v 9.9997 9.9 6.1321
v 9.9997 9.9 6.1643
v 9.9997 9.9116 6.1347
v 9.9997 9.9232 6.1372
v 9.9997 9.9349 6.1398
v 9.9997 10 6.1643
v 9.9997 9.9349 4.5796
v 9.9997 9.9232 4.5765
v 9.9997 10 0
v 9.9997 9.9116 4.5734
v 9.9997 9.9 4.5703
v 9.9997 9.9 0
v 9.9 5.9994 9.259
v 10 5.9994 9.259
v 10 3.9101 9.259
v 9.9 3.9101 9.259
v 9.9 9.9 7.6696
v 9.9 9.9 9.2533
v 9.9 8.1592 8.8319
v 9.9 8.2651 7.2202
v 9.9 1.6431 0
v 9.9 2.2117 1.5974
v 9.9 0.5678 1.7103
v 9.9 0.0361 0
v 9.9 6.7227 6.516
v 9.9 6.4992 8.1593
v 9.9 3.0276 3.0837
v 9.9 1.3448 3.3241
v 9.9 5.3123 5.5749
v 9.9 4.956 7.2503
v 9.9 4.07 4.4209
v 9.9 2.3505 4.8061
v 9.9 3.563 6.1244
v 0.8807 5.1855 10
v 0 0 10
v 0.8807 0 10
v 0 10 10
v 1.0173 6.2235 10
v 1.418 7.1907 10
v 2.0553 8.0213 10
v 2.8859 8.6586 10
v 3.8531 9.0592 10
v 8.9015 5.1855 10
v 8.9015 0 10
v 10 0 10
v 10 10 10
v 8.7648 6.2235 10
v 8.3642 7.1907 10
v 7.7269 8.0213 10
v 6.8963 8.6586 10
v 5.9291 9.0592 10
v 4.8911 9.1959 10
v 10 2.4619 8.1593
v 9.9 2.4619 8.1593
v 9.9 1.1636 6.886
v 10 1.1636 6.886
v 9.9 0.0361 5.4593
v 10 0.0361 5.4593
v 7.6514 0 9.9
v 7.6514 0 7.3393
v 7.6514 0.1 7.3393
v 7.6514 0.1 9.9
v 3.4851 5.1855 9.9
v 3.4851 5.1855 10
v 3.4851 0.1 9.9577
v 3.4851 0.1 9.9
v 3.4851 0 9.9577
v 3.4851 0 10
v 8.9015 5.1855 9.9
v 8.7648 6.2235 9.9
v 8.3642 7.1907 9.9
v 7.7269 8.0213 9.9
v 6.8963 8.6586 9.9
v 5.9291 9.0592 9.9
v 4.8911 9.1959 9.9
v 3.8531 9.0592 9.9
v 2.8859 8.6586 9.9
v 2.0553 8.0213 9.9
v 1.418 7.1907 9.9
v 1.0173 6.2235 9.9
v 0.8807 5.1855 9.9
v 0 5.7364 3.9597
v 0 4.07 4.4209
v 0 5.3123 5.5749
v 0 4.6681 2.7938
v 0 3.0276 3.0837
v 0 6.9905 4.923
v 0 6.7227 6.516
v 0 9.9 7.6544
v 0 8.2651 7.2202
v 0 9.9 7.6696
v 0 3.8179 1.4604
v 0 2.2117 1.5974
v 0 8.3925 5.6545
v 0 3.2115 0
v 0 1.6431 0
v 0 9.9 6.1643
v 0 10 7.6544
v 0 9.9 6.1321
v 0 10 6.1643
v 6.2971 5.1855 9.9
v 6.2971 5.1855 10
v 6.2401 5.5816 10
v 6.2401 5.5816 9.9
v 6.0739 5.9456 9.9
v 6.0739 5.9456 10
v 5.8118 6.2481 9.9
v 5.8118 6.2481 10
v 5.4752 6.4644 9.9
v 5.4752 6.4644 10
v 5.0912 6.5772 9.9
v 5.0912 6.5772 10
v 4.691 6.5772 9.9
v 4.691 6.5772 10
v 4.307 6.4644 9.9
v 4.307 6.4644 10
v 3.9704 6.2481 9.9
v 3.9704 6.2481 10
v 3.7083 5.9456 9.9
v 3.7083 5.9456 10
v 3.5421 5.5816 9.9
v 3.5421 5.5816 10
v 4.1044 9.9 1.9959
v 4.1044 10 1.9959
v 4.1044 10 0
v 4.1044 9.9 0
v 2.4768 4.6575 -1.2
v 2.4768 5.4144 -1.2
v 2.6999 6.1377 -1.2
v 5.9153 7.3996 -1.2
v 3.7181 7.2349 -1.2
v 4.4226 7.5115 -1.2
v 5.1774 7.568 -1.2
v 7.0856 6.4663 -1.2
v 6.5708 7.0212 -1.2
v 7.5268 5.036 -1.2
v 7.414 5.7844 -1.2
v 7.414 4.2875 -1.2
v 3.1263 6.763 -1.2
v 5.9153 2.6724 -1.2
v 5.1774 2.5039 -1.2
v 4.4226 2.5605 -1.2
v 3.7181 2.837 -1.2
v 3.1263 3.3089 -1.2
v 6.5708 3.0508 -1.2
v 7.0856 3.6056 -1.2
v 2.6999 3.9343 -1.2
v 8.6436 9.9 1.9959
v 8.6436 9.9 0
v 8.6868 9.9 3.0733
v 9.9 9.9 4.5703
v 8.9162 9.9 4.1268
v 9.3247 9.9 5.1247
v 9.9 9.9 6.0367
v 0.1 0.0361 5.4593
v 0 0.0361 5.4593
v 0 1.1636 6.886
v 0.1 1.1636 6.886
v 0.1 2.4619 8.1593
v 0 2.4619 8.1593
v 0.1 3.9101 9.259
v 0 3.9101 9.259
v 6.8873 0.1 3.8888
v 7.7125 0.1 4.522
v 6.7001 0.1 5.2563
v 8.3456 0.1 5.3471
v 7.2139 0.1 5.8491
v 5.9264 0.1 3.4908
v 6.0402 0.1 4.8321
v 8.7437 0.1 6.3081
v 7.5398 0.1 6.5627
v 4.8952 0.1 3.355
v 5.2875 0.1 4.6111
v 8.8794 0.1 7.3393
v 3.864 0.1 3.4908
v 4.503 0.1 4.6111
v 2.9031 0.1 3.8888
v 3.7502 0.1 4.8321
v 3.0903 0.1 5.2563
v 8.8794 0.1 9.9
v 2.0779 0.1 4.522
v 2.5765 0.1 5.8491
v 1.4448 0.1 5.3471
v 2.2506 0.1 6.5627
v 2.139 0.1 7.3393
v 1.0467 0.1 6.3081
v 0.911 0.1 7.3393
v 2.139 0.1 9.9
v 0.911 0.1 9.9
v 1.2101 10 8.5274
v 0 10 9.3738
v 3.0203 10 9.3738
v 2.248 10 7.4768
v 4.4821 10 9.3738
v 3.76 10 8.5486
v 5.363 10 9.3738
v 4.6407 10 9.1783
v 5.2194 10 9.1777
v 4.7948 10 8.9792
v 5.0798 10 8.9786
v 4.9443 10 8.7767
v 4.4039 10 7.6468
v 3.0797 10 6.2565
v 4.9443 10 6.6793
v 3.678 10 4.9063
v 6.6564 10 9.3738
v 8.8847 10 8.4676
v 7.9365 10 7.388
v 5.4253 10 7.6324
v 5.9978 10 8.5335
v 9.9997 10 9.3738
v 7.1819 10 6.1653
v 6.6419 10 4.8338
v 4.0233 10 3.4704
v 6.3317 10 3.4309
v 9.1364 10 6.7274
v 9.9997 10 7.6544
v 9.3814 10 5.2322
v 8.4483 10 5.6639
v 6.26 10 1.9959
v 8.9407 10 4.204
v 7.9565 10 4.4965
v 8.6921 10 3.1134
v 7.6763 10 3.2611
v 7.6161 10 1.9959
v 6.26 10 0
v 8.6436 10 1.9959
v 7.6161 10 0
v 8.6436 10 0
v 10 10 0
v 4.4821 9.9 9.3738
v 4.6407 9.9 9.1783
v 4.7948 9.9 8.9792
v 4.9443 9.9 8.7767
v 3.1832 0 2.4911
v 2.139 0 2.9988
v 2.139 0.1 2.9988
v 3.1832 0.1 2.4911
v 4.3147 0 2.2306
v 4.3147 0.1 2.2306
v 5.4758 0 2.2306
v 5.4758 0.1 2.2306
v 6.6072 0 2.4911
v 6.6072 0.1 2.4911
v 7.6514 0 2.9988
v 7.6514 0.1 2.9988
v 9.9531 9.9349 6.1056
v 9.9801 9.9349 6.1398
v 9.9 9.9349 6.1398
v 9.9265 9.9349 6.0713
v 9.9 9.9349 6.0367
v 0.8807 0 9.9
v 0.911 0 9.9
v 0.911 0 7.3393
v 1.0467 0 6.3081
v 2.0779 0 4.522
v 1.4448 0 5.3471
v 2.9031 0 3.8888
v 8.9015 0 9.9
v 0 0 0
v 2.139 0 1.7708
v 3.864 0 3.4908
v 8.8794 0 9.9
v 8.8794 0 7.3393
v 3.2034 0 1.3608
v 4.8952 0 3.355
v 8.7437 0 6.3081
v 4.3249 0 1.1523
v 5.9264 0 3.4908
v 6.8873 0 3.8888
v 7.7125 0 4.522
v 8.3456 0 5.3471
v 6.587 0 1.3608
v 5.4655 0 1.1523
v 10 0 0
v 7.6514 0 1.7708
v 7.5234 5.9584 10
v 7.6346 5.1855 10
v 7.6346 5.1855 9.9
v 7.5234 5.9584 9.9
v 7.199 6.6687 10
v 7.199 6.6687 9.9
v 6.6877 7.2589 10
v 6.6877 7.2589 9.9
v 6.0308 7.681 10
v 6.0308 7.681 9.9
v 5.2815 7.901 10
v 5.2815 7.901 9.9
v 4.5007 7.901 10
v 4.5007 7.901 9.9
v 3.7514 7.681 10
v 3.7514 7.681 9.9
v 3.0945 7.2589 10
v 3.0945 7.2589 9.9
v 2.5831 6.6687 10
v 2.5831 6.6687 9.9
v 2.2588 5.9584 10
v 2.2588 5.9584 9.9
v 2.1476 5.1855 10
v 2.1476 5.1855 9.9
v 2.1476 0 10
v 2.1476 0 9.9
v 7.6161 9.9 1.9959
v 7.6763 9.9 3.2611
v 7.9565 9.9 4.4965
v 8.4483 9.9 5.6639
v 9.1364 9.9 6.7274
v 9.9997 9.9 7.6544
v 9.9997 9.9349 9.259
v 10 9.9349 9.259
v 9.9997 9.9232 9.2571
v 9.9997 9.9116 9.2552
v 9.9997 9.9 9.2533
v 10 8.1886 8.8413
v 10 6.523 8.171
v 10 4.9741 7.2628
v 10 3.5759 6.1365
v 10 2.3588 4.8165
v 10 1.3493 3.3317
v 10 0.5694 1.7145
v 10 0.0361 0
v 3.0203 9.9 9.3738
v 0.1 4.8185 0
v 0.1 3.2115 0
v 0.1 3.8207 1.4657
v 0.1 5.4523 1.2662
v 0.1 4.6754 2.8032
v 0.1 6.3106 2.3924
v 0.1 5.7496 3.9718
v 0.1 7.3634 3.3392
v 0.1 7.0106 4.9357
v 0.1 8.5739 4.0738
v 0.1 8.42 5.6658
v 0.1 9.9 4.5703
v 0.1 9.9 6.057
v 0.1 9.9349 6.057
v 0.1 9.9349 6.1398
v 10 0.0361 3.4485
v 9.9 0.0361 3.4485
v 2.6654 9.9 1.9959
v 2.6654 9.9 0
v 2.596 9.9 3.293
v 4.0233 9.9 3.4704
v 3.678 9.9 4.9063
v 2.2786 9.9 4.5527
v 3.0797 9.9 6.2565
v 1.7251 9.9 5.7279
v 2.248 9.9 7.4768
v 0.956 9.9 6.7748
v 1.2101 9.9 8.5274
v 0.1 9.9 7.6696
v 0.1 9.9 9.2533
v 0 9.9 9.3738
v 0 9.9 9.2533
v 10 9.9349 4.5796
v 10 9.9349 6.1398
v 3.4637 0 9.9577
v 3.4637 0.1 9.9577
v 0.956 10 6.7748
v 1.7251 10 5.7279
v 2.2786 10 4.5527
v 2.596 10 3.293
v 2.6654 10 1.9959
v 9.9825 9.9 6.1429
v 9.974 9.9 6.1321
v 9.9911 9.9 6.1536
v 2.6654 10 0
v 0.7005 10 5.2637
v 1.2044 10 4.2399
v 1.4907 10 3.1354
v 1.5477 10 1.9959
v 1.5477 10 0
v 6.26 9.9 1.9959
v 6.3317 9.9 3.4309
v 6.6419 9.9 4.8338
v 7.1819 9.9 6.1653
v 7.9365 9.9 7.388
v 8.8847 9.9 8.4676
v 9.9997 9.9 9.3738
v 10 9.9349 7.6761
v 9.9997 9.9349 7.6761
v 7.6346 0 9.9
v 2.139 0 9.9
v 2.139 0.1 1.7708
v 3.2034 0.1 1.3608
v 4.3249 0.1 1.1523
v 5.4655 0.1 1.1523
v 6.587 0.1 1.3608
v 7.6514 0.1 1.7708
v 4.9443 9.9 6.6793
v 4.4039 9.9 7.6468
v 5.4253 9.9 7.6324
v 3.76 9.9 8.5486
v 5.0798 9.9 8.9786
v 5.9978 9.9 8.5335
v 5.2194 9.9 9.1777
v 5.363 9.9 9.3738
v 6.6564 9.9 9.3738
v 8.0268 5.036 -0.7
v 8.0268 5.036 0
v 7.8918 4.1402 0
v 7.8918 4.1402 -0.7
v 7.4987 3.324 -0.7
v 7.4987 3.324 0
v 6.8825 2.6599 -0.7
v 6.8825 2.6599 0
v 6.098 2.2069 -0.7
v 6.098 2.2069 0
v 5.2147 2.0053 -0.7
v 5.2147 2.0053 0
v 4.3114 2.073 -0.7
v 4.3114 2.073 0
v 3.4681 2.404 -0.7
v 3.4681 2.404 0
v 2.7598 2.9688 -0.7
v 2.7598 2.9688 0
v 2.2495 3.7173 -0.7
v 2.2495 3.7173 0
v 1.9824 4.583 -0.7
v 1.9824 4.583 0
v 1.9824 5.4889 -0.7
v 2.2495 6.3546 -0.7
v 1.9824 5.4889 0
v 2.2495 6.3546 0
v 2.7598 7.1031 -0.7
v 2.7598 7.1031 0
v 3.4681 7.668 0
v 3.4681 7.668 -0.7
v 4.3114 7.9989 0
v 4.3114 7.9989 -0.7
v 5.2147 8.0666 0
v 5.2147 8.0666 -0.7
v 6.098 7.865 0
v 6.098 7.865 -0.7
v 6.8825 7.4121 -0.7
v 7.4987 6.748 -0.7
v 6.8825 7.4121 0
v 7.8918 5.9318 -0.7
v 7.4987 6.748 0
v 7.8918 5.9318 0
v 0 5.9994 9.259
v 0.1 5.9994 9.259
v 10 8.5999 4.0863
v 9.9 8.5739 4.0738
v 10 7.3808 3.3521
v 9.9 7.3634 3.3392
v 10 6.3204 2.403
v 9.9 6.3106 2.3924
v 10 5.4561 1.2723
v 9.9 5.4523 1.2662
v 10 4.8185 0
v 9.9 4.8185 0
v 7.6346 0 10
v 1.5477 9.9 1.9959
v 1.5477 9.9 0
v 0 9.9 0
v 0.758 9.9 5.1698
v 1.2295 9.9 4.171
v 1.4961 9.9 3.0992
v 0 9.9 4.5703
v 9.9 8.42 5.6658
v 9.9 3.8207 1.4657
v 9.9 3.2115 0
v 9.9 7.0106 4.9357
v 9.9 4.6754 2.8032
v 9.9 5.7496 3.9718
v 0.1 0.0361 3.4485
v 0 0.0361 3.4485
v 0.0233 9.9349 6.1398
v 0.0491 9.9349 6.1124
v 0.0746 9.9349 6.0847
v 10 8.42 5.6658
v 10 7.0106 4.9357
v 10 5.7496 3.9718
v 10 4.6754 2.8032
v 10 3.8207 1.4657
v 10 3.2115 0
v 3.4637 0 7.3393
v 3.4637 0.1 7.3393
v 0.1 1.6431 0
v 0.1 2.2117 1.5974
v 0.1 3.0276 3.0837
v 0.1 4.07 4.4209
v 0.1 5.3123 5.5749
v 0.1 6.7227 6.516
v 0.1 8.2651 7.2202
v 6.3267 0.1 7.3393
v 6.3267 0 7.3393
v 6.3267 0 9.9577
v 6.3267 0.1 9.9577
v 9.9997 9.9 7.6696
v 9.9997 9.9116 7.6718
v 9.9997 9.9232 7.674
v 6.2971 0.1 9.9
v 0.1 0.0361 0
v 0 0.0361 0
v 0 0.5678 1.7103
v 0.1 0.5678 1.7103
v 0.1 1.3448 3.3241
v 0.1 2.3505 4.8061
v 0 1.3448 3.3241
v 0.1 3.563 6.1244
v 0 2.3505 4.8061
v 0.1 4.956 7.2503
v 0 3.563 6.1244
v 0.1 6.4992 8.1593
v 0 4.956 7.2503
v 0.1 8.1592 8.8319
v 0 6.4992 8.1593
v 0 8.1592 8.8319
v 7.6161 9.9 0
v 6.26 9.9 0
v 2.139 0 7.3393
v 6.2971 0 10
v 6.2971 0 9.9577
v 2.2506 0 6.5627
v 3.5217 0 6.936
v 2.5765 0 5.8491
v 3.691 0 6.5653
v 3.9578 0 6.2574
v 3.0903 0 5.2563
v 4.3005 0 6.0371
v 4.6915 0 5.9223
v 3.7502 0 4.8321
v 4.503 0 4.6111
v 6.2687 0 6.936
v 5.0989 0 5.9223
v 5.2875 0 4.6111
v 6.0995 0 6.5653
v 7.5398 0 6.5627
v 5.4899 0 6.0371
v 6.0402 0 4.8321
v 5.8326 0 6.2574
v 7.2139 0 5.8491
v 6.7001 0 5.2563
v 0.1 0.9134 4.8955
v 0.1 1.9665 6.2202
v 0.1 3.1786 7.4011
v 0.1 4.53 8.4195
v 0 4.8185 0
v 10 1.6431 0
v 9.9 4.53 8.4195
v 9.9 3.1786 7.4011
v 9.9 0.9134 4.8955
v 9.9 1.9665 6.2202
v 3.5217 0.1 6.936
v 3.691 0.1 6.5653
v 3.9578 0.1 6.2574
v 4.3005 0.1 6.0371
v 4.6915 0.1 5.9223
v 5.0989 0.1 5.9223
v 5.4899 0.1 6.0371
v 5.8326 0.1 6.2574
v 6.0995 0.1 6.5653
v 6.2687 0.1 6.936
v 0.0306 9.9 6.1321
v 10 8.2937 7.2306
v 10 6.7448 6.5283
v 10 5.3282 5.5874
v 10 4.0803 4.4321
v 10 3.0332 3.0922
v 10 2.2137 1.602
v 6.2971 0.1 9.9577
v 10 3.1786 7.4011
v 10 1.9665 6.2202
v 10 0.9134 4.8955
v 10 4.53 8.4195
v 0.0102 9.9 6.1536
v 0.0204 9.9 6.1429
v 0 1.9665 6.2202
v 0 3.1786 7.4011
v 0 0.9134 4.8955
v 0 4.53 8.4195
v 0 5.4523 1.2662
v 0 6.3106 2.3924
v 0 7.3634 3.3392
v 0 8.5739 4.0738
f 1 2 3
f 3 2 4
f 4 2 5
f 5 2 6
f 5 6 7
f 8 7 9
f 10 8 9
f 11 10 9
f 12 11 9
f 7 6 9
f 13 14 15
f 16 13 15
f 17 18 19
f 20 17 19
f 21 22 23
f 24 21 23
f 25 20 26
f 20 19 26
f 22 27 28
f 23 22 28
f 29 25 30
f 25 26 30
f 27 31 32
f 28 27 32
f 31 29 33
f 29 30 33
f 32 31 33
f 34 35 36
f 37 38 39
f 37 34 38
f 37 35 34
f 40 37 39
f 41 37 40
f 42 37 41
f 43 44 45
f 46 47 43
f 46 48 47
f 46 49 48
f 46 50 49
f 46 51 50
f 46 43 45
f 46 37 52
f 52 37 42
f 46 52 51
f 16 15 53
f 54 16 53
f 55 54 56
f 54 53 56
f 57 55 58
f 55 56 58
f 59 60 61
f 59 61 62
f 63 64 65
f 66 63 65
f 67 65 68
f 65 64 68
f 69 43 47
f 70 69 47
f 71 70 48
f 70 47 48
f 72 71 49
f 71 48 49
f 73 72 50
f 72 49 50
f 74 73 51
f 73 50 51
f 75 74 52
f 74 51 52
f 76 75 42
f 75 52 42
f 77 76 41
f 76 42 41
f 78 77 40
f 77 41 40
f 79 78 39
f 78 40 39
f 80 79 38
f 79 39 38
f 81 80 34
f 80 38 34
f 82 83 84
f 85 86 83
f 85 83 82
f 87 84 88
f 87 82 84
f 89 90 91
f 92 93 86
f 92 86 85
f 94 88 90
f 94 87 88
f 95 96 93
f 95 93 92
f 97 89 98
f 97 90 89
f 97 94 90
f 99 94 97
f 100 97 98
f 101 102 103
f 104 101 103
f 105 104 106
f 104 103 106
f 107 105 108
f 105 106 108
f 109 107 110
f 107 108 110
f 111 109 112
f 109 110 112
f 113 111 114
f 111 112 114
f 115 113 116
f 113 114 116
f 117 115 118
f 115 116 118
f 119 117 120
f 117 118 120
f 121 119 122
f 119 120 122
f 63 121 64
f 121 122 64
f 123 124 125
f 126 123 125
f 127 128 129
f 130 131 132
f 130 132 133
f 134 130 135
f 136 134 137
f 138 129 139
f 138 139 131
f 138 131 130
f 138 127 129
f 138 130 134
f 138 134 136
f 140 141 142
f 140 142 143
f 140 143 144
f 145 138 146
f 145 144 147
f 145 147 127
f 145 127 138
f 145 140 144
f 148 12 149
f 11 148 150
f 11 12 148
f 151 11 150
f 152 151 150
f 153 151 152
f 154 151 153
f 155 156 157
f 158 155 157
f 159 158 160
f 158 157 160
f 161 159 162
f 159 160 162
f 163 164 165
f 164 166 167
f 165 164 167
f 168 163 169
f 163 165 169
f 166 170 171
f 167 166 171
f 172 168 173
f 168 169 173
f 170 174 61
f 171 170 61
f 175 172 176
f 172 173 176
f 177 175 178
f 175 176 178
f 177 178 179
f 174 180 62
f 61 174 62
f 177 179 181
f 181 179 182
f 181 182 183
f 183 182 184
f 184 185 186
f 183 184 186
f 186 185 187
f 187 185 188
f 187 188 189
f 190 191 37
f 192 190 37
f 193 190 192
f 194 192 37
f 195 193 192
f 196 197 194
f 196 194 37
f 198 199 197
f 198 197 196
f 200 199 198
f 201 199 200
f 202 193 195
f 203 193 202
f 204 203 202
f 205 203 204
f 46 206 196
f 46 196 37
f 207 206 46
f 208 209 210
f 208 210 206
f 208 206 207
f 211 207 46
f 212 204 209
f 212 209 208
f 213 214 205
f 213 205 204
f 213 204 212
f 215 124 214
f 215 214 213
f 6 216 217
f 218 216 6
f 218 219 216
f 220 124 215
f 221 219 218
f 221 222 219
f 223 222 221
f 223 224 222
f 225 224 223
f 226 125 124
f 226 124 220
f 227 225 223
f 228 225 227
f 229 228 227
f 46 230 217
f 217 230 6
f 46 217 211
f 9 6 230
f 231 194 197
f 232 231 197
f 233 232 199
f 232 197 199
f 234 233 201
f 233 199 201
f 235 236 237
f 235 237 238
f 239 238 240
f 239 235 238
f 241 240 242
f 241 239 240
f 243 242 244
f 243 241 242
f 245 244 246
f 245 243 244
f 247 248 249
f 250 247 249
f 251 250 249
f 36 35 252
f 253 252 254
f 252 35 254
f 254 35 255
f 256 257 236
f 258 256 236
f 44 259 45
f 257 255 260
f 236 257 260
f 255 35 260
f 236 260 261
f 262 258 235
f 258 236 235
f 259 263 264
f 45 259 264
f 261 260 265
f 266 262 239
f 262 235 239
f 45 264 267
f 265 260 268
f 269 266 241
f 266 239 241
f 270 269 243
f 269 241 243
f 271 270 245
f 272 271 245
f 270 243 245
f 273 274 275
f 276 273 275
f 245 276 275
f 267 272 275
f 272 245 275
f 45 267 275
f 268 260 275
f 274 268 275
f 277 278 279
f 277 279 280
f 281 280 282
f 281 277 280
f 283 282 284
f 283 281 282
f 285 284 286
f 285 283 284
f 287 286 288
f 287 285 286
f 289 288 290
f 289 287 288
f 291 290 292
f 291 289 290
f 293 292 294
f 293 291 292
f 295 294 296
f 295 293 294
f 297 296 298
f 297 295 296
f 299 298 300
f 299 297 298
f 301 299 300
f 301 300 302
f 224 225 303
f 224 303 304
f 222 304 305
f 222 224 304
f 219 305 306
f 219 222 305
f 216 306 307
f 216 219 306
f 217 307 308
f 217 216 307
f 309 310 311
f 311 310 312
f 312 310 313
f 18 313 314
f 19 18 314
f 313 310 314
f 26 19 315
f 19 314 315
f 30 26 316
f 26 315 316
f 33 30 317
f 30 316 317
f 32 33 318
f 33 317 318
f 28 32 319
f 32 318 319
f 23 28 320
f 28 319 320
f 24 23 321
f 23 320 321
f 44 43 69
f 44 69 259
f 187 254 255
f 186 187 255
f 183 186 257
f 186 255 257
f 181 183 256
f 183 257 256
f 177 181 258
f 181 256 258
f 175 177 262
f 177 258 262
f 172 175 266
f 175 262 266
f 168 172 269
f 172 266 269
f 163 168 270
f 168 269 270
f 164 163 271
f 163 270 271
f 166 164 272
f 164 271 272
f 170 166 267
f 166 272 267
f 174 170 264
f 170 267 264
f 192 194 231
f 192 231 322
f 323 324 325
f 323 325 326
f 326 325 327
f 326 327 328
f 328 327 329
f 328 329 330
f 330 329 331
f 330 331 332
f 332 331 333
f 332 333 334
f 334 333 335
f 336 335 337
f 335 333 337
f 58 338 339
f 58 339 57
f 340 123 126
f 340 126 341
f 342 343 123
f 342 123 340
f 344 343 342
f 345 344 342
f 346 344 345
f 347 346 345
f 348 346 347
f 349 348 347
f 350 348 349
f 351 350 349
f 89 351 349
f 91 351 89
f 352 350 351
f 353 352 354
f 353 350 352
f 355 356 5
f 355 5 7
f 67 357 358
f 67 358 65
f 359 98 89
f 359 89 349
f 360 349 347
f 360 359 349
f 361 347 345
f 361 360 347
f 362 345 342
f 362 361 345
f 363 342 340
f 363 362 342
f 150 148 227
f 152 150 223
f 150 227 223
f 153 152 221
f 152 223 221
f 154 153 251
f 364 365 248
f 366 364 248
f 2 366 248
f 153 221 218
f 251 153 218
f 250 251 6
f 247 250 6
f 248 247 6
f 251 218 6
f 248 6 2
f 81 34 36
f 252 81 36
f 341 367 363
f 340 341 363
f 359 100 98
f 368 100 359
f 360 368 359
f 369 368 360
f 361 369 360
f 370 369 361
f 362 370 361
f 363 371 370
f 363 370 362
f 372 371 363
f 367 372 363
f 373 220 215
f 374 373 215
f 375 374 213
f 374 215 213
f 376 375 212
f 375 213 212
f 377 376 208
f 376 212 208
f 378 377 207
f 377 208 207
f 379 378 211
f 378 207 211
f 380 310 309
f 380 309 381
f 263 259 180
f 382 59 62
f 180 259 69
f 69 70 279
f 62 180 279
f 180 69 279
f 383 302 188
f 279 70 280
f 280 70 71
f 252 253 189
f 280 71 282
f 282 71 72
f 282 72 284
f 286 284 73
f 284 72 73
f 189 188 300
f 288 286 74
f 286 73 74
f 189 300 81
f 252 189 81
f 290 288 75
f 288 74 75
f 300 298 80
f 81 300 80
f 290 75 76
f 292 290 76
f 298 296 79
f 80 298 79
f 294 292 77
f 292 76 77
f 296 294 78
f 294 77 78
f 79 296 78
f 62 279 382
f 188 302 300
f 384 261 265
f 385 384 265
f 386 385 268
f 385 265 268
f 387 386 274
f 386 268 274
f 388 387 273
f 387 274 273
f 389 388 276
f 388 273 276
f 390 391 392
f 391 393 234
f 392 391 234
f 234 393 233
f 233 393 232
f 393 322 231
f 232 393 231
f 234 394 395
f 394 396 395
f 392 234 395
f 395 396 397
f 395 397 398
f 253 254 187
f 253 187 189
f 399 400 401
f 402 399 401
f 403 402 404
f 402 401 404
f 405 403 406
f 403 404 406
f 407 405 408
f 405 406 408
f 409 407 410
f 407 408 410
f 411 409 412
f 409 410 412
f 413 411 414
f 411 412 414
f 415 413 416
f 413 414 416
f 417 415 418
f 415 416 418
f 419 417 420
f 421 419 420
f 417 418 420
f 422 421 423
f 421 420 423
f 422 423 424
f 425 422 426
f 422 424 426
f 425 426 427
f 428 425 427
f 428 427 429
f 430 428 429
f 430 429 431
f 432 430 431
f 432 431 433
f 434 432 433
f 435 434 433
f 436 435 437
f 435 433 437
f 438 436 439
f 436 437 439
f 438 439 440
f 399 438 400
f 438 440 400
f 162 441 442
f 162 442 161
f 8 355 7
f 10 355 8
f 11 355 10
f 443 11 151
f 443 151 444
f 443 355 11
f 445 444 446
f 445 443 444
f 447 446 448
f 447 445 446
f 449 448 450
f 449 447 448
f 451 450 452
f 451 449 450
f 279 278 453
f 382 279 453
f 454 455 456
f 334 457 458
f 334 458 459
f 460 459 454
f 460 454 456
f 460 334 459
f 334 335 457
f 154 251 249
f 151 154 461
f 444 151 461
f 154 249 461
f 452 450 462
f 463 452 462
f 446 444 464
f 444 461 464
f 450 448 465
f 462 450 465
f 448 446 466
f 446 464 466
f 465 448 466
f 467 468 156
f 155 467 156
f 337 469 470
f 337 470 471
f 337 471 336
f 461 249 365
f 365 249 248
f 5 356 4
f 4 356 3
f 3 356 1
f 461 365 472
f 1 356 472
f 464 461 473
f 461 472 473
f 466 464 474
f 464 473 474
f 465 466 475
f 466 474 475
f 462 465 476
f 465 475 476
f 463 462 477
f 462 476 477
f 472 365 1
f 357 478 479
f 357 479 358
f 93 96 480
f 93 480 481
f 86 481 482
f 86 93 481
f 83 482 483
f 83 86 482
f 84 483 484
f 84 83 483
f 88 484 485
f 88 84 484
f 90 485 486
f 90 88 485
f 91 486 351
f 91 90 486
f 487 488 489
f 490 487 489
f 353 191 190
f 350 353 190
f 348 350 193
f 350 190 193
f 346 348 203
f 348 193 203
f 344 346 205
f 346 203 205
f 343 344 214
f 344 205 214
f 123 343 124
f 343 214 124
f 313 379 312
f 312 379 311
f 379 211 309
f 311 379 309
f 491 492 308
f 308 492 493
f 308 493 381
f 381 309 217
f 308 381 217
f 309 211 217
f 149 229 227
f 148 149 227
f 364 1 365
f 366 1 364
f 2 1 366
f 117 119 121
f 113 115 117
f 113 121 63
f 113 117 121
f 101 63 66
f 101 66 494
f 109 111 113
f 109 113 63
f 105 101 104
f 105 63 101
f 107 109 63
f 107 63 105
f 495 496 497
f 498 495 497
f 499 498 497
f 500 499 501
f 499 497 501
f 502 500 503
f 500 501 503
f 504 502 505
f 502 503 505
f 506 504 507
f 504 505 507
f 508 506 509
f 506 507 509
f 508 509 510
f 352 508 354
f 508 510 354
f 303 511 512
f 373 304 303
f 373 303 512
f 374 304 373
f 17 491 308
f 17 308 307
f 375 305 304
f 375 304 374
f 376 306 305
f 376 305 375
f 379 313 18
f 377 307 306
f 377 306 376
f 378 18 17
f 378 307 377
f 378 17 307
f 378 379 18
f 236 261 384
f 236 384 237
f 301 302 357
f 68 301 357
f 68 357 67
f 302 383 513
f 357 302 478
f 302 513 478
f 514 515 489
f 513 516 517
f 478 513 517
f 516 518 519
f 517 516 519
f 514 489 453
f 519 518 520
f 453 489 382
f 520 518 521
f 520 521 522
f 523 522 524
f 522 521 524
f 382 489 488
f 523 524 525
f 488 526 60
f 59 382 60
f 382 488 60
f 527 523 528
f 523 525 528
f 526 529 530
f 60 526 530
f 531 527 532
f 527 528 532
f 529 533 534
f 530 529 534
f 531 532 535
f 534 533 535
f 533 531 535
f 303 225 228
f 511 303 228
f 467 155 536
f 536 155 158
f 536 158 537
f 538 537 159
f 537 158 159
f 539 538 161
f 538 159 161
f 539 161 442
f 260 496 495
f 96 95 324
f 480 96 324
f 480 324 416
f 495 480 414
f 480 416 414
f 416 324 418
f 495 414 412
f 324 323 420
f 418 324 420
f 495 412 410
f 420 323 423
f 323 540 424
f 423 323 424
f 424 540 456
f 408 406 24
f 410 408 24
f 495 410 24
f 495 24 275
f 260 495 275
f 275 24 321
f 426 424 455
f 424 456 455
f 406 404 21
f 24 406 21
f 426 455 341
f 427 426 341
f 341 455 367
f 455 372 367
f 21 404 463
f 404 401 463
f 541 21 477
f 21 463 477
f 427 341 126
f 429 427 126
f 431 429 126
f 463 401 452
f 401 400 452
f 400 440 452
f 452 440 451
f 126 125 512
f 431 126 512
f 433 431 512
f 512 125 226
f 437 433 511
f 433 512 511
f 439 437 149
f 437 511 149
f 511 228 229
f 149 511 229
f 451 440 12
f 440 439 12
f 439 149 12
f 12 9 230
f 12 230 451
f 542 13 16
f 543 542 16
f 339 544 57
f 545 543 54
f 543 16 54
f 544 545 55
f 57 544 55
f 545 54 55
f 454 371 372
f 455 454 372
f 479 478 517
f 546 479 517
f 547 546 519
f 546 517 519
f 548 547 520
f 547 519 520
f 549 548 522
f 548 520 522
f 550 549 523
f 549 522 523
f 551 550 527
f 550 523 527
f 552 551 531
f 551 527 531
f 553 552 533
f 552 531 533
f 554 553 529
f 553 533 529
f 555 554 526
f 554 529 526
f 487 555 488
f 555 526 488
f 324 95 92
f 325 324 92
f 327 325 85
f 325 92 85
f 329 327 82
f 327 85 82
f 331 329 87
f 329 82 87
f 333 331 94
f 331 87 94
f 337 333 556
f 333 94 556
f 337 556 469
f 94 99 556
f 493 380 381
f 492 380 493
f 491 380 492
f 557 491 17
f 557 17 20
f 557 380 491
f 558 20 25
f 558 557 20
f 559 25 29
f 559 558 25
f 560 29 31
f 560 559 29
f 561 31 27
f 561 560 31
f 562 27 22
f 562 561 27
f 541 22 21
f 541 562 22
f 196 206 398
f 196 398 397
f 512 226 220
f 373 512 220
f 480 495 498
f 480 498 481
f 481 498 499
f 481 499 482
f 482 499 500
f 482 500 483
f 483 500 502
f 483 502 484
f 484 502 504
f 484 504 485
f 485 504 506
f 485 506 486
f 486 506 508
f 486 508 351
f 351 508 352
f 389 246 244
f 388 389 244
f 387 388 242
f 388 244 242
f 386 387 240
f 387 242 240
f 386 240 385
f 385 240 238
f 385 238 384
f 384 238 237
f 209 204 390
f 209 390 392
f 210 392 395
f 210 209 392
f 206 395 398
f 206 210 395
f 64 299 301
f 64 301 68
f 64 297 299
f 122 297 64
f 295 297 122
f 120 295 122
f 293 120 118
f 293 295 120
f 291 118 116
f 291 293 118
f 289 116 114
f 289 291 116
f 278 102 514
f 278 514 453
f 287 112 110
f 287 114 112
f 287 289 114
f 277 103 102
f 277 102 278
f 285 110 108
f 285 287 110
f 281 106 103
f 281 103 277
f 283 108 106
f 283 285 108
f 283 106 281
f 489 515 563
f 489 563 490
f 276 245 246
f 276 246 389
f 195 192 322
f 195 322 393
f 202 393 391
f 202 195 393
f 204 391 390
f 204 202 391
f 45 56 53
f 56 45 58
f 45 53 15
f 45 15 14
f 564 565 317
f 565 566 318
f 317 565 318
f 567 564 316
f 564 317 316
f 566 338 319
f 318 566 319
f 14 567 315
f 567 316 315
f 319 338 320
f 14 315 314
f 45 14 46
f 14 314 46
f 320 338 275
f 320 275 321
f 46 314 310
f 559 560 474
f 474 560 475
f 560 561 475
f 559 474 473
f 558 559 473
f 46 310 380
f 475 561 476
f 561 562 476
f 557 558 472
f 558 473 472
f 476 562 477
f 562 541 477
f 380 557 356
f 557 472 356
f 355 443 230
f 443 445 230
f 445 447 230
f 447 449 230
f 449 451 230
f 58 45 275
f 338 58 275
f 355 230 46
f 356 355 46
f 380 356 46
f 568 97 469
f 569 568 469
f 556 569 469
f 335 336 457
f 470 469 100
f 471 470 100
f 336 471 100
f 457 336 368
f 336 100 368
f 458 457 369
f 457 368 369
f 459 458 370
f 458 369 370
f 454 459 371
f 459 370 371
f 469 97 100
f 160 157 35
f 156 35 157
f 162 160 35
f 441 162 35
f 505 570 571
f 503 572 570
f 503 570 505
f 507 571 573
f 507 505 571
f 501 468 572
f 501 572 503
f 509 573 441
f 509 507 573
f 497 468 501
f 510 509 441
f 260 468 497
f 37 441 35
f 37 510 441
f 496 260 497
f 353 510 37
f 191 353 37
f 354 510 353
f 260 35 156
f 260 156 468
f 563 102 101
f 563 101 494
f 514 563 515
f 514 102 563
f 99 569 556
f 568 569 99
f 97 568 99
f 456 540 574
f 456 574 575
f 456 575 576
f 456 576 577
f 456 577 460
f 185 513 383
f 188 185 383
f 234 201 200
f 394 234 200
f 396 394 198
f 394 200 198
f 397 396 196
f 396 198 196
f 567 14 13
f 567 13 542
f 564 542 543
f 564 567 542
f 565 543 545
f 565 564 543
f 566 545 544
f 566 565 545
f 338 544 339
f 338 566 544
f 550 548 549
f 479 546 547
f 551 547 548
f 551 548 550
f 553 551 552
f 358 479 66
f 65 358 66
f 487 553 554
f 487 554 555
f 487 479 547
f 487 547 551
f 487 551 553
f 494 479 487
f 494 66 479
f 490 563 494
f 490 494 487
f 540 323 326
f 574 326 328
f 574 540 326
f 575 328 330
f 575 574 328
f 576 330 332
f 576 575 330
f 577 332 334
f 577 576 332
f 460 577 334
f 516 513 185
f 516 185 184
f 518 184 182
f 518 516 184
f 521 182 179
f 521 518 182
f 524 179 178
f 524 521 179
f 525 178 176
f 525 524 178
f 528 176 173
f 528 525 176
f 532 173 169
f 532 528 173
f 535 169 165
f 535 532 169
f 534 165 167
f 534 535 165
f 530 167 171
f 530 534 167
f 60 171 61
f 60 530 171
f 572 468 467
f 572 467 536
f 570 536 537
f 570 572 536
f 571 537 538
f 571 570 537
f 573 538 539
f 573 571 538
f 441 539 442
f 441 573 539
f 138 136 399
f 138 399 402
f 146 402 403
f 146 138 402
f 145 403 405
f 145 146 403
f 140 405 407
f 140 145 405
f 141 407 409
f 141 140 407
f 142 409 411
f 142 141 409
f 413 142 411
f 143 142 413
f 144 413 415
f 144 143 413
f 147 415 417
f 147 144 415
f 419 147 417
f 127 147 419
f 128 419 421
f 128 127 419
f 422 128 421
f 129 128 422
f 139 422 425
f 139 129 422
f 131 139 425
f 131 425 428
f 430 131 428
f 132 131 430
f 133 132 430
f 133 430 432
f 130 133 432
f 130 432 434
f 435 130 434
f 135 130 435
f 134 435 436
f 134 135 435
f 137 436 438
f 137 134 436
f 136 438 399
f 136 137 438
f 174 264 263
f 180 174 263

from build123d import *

# Parameters (mm, degrees)
BOX_W           = 10
BOX_H           = 10
BOX_DEPTH       = 10
POCKET_DEPTH    = 0.1
POCKET001_DEPTH = 0.1
POCKET002_DEPTH = 0.1
POCKET003_DEPTH = 0.1
POCKET004_DEPTH = 0.1
SKETCH004_R     = 3.039145
PAD_DEPTH       = 1.2
CHAMFER_SIZE    = 0.5


with BuildPart() as part:
    # Box → Box (new body)
    with BuildSketch(Plane.XY):
        with Locations((5, 5)):
            Rectangle(BOX_W, BOX_H)
    extrude(amount=BOX_DEPTH)

    # Sketch → Pocket (cut)
    with BuildSketch(Plane.XZ):
        with BuildLine():
            ThreePointArc((3.463706, 7.339263), (4.895207, 5.907762), (6.326707, 7.339263))
            Line((6.326707, 7.339263), (6.326707, 9.957689))
            Line((3.463706, 9.957689), (6.326707, 9.957689))
            Line((3.463706, 7.339263), (3.463706, 9.957689))
        make_face()
        with BuildLine():
            ThreePointArc((2.138992, 7.339263), (4.895207, 4.583048), (7.651421, 7.339263))
            Line((7.651421, 7.339263), (7.651421, 9.957689))
            Line((7.651421, 9.957689), (8.879433, 9.957689))
            Line((8.879433, 7.339263), (8.879433, 9.957689))
            ThreePointArc((0.91098, 7.339263), (4.895207, 3.355036), (8.879433, 7.339263))
            Line((0.91098, 7.339263), (0.91098, 9.957689))
            Line((0.91098, 9.957689), (2.138992, 9.957689))
            Line((2.138992, 7.339263), (2.138992, 9.957689))
        make_face()
        with BuildLine():
            ThreePointArc((2.138992, 2.99885), (4.895207, 2.197677), (7.651421, 2.99885))
            Line((7.651421, 2.99885), (7.651421, 1.770838))
            ThreePointArc((2.138992, 1.770838), (4.895207, 1.126045), (7.651421, 1.770838))
            Line((2.138992, 1.770838), (2.138992, 2.99885))
        make_face()
    extrude(amount=-POCKET_DEPTH, mode=Mode.SUBTRACT)

    # Sketch002 → Pocket001 (cut)
    with BuildSketch(Plane(origin=(0, 0, 0), x_dir=(0, -1, 0), z_dir=(-1, 0, 0))):
        with BuildLine():
            ThreePointArc((-4.81849, 0), (-6.828268, 2.9025), (-9.934856, 4.579648))
            Line((-9.934856, 6.139799), (-9.934856, 4.579648))
            ThreePointArc((-3.211477, 0), (-5.749594, 3.971752), (-9.934856, 6.139799))
            Line((-4.81849, 0), (-3.211477, 0))
        make_face()
        with BuildLine():
            ThreePointArc((-1.643138, 0), (-4.681073, 5.034844), (-9.934856, 7.676145))
            Line((-9.934856, 9.258963), (-9.934856, 7.676145))
            ThreePointArc((-0.036126, 0), (-3.575905, 6.136466), (-9.934856, 9.258963))
            Line((-1.643138, 0), (-0.036126, 0))
        make_face()
        with BuildLine():
            ThreePointArc((-0.036126, 3.448501), (-2.553846, 6.82983), (-5.999368, 9.258963))
            Line((-5.999368, 9.258963), (-3.910095, 9.258963))
            ThreePointArc((-0.036126, 5.459331), (-1.792647, 7.543141), (-3.910095, 9.258963))
            Line((-0.036126, 3.448501), (-0.036126, 5.459331))
        make_face()
    extrude(amount=-POCKET001_DEPTH, mode=Mode.SUBTRACT)

    # MirroredSketch → Pocket002 (cut)
    with BuildSketch(Plane.YZ.offset(10)):
        with BuildLine():
            ThreePointArc((9.934856, 4.579648), (6.828268, 2.9025), (4.81849, 0))
            Line((4.81849, 0), (3.211477, 0))
            ThreePointArc((9.934856, 6.139799), (5.749594, 3.971752), (3.211477, 0))
            Line((9.934856, 6.139799), (9.934856, 4.579648))
        make_face()
        with BuildLine():
            ThreePointArc((9.934856, 7.676145), (4.681073, 5.034844), (1.643138, 0))
            Line((1.643138, 0), (0.036126, 0))
            ThreePointArc((9.934856, 9.258963), (3.575905, 6.136466), (0.036126, 0))
            Line((9.934856, 9.258963), (9.934856, 7.676145))
        make_face()
        with BuildLine():
            ThreePointArc((5.999368, 9.258963), (2.553846, 6.82983), (0.036126, 3.448501))
            Line((0.036126, 3.448501), (0.036126, 5.459331))
            ThreePointArc((3.910095, 9.258963), (1.792647, 7.543141), (0.036126, 5.459331))
            Line((5.999368, 9.258963), (3.910095, 9.258963))
        make_face()
    extrude(amount=-POCKET002_DEPTH, mode=Mode.SUBTRACT)

    # Sketch003 → Pocket003 (cut)
    with BuildSketch(Plane(origin=(0, 10, 0), x_dir=(-1, 0, 0), z_dir=(0, 1, 0))):
        with BuildLine():
            Line((-9.999658, -0.012374), (-8.643554, -0.012374))
            Line((-8.643554, -0.012374), (-8.643554, 1.995852))
            ThreePointArc((-8.643554, 1.995852), (-8.940726, 4.204003), (-9.999658, 6.164336))
            Line((-9.999658, 6.164336), (-9.999658, -0.012374))
        make_face()
        with BuildLine():
            Line((-1.547691, 0), (0, 0))
            Line((0, 0), (0, 6.164336))
            ThreePointArc((0, 6.164336), (-1.204366, 4.239939), (-1.547691, 1.995852))
            Line((-1.547691, 1.995852), (-1.547691, 0))
        make_face()
        with BuildLine():
            Line((-4.104364, 0), (-2.665364, 0))
            Line((-2.665364, 0), (-2.665364, 1.995852))
            ThreePointArc((0, 7.654373), (-2.030261, 5.153697), (-2.665364, 1.995852))
            Line((0, 7.654373), (0, 9.37382))
            ThreePointArc((0, 9.37382), (-3.079716, 6.256453), (-4.104364, 1.995852))
            Line((-4.104364, 1.995852), (-4.104364, 0))
        make_face()
        with BuildLine():
            Line((-7.616147, 0), (-6.260043, 0))
            Line((-6.260043, 0), (-6.260043, 1.995852))
            ThreePointArc((-6.260043, 1.995852), (-7.181906, 6.165314), (-9.999658, 9.37382))
            Line((-9.999658, 9.37382), (-9.999658, 7.654373))
            ThreePointArc((-7.616147, 1.995852), (-8.176765, 5.090964), (-9.999658, 7.654373))
            Line((-7.616147, 1.995852), (-7.616147, 0))
        make_face()
        with BuildLine():
            Line((-6.65638, 9.37382), (-5.363037, 9.37382))
            ThreePointArc((-4.944312, 8.776727), (-5.149072, 9.078501), (-5.363037, 9.37382))
            ThreePointArc((-4.482091, 9.37382), (-4.718282, 9.079206), (-4.944312, 8.776727))
            Line((-4.482091, 9.37382), (-3.020288, 9.37382))
            ThreePointArc((-3.020288, 9.37382), (-4.094424, 8.106605), (-4.944312, 6.679266))
            ThreePointArc((-4.944312, 6.679266), (-5.700431, 8.090028), (-6.65638, 9.37382))
        make_face()
    extrude(amount=-POCKET003_DEPTH, mode=Mode.SUBTRACT)

    # Sketch001 → Pocket004 (cut)
    with BuildSketch(Plane.XY.offset(10)):
        with BuildLine():
            ThreePointArc((7.634555, 5.18548), (4.891092, 7.928942), (2.14763, 5.18548))
            Line((2.14763, 5.18548), (2.14763, -0.110033))
            Line((0.880684, -0.110033), (2.14763, -0.110033))
            Line((0.880684, 5.18548), (0.880684, -0.110033))
            ThreePointArc((8.901501, 5.18548), (4.891092, 9.195889), (0.880684, 5.18548))
            Line((8.901501, 5.18548), (8.901501, -0.110033))
            Line((7.634555, -0.110033), (8.901501, -0.110033))
            Line((7.634555, 5.18548), (7.634555, -0.110033))
        make_face()
        with BuildLine():
            ThreePointArc((6.297082, 5.18548), (4.891092, 6.591469), (3.485103, 5.18548))
            Line((3.485103, 5.18548), (3.485103, -0.110033))
            Line((3.485103, -0.110033), (6.297082, -0.110033))
            Line((6.297082, 5.18548), (6.297082, -0.110033))
        make_face()
    extrude(amount=-POCKET004_DEPTH, mode=Mode.SUBTRACT)

    # Sketch004 → Pad (new body)
    with BuildSketch(Plane(origin=(0, 0, 0), x_dir=(1, 0, 0), z_dir=(0, 0, -1))):
        with Locations((4.98763, -5.035975)):
            Circle(SKETCH004_R)
    extrude(amount=PAD_DEPTH)

    # Chamfer
    chamfer_edges = [part.edges().sort_by_distance(p)[0] for p in [
        (1.948485, 5.035975, -1.2),
    ]]
    chamfer(chamfer_edges, length=CHAMFER_SIZE)


solid = part.part
